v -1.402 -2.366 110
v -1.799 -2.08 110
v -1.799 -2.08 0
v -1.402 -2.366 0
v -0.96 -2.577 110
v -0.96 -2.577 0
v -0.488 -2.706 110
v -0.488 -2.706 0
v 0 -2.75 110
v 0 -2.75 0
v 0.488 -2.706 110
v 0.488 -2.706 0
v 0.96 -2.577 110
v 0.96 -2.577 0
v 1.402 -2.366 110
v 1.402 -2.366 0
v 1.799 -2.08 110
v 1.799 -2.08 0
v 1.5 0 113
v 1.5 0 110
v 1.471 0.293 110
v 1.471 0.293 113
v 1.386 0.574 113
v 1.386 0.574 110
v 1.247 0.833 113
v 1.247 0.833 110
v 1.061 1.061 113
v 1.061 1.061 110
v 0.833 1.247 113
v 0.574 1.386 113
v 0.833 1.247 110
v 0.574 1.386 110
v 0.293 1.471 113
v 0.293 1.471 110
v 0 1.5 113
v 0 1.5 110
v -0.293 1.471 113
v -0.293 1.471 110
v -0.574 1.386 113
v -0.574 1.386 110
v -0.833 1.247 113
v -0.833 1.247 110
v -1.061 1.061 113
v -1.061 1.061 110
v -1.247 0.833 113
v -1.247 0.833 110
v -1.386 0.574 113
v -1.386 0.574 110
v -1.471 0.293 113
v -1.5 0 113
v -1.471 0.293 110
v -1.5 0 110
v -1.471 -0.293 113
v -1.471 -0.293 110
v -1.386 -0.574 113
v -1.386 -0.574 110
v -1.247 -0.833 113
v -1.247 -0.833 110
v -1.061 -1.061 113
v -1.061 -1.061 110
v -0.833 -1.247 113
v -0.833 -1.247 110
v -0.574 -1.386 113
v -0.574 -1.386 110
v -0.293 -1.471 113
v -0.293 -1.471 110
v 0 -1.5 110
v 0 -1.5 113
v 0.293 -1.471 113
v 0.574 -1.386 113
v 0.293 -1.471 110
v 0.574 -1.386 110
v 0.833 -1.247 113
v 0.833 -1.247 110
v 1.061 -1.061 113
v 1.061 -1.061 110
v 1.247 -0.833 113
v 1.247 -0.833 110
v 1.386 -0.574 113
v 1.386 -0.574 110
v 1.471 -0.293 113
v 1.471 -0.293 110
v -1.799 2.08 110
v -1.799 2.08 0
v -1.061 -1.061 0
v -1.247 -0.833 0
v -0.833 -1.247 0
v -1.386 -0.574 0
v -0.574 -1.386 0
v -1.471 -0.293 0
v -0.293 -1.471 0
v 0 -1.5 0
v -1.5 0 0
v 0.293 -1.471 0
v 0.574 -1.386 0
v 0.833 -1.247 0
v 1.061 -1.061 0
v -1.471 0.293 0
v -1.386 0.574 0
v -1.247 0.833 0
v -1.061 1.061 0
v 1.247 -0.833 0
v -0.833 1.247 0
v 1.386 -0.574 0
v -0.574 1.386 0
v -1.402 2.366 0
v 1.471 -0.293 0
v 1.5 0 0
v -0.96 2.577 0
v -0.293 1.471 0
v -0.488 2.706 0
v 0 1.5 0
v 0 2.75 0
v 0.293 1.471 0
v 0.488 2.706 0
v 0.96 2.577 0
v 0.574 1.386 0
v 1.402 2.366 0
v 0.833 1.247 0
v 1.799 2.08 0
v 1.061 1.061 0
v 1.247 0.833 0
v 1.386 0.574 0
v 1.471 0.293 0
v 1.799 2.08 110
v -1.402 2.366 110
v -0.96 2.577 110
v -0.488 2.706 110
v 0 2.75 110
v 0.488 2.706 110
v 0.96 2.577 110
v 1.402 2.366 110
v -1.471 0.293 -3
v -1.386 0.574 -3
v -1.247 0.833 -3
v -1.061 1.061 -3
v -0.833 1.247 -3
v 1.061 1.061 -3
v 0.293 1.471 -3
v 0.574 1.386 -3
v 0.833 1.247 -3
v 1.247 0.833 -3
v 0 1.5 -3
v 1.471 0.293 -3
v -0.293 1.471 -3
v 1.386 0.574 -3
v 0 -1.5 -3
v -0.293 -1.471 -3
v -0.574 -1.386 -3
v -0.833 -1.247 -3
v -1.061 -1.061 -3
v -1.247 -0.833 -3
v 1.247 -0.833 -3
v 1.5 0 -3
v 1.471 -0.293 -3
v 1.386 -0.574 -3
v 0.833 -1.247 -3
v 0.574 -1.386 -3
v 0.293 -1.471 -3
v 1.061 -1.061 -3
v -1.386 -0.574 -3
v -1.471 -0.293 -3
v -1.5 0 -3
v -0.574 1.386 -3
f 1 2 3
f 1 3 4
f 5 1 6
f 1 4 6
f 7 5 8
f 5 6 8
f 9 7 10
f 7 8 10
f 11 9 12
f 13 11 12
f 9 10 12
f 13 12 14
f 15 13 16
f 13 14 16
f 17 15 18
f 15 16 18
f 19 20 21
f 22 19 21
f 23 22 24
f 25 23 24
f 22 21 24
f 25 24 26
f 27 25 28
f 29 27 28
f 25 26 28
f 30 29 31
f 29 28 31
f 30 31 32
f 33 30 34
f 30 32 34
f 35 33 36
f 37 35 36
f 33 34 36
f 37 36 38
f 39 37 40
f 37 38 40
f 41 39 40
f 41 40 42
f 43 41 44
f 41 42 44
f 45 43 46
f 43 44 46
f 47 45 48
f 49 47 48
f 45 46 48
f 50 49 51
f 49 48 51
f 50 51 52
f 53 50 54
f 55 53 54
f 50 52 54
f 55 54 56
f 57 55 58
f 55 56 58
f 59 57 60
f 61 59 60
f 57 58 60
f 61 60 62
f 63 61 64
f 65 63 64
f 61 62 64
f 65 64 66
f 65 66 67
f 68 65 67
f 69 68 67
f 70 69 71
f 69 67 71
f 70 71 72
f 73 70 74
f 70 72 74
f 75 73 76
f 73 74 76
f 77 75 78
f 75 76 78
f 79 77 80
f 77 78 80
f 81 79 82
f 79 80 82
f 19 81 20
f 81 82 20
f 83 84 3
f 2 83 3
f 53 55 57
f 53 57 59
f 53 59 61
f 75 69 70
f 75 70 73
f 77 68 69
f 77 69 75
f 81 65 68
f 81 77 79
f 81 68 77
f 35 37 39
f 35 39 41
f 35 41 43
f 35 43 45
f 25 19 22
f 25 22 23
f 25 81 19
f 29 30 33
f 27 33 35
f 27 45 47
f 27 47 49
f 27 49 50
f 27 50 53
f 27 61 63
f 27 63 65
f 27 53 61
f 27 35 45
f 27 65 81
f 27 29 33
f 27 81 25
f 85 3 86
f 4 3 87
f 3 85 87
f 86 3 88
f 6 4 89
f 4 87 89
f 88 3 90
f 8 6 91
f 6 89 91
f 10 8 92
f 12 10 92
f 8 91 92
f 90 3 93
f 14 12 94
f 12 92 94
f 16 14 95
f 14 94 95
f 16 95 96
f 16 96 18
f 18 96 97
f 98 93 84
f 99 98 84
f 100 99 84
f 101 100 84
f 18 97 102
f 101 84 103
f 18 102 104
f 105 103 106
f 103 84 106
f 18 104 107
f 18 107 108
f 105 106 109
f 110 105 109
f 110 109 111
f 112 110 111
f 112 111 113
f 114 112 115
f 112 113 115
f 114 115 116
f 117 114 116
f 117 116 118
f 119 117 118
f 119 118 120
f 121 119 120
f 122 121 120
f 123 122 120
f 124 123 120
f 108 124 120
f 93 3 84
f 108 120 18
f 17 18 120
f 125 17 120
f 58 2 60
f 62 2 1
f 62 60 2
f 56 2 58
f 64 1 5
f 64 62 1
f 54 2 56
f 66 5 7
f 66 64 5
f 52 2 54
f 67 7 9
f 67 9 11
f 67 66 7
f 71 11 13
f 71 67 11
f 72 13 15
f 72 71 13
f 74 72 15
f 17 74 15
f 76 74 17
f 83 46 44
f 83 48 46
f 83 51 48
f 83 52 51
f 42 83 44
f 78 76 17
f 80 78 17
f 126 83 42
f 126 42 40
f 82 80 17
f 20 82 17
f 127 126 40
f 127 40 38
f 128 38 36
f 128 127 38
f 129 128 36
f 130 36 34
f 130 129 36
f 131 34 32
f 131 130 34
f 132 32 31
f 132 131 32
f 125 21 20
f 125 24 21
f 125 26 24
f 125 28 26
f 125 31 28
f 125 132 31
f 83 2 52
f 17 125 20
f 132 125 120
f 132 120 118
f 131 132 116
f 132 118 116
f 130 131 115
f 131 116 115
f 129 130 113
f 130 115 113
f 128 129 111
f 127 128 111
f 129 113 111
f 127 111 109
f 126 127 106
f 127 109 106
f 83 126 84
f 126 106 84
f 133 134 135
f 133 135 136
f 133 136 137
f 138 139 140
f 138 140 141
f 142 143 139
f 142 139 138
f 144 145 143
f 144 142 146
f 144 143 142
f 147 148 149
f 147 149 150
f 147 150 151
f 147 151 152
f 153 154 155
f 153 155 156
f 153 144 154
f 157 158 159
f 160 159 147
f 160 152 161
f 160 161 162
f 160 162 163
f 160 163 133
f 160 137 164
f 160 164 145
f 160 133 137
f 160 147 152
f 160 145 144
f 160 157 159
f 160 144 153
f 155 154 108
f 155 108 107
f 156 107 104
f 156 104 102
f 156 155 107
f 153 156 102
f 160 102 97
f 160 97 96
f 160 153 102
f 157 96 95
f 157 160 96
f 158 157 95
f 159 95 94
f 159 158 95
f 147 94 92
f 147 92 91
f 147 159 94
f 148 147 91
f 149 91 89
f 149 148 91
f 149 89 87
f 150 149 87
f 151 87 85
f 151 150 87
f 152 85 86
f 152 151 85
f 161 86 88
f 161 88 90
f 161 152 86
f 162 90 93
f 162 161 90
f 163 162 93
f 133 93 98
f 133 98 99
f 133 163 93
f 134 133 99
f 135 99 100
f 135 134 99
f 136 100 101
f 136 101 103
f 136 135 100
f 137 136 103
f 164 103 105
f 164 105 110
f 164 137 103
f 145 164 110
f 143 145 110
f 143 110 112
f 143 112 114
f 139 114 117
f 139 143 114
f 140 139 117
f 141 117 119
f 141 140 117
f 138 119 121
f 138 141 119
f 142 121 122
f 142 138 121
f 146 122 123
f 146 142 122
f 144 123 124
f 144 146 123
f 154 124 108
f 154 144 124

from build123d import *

# Parameters (mm, degrees)
Y_KSEKLIK_EKSTR_ZYON1_DEPTH = 110
IZIM5_R                     = 1.5
Y_KSEKLIK_EKSTR_ZYON3_DEPTH = 3
Y_KSEKLIK_EKSTR_ZYON4_START = 3
IZIM6_R                     = 1.5
Y_KSEKLIK_EKSTR_ZYON4_DEPTH = 3


with BuildPart() as part:
    # Çizim2 → Yükseklik-Ekstrüzyon1 (new body)
    with BuildSketch(Plane.XY):
        with BuildLine():
            ThreePointArc((1.79891634, 2.08), (0, 2.75), (-1.79891634, 2.08))
            Line((-1.79891634, 2.08), (-1.79891634, -2.08))
            ThreePointArc((-1.79891634, -2.08), (0, -2.75), (1.79891634, -2.08))
            Line((1.79891634, -2.08), (1.79891634, 2.08))
        make_face()
    extrude(amount=Y_KSEKLIK_EKSTR_ZYON1_DEPTH)

    # Çizim5 → Yükseklik-Ekstrüzyon3 (add)
    with BuildSketch(Plane.XY.offset(110)):
        Circle(IZIM5_R)
    extrude(amount=Y_KSEKLIK_EKSTR_ZYON3_DEPTH)

    # Çizim6 → Yükseklik-Ekstrüzyon4 (add)
    with BuildSketch(Plane(origin=(0, 0, 0), x_dir=(-1, 0, 0), z_dir=(0, 0, -1)).offset(Y_KSEKLIK_EKSTR_ZYON4_START)):
        with Locations(Location((0, 0, 0), (0, 0, 180))):
            Circle(IZIM6_R)
    extrude(amount=-Y_KSEKLIK_EKSTR_ZYON4_DEPTH)


solid = part.part
